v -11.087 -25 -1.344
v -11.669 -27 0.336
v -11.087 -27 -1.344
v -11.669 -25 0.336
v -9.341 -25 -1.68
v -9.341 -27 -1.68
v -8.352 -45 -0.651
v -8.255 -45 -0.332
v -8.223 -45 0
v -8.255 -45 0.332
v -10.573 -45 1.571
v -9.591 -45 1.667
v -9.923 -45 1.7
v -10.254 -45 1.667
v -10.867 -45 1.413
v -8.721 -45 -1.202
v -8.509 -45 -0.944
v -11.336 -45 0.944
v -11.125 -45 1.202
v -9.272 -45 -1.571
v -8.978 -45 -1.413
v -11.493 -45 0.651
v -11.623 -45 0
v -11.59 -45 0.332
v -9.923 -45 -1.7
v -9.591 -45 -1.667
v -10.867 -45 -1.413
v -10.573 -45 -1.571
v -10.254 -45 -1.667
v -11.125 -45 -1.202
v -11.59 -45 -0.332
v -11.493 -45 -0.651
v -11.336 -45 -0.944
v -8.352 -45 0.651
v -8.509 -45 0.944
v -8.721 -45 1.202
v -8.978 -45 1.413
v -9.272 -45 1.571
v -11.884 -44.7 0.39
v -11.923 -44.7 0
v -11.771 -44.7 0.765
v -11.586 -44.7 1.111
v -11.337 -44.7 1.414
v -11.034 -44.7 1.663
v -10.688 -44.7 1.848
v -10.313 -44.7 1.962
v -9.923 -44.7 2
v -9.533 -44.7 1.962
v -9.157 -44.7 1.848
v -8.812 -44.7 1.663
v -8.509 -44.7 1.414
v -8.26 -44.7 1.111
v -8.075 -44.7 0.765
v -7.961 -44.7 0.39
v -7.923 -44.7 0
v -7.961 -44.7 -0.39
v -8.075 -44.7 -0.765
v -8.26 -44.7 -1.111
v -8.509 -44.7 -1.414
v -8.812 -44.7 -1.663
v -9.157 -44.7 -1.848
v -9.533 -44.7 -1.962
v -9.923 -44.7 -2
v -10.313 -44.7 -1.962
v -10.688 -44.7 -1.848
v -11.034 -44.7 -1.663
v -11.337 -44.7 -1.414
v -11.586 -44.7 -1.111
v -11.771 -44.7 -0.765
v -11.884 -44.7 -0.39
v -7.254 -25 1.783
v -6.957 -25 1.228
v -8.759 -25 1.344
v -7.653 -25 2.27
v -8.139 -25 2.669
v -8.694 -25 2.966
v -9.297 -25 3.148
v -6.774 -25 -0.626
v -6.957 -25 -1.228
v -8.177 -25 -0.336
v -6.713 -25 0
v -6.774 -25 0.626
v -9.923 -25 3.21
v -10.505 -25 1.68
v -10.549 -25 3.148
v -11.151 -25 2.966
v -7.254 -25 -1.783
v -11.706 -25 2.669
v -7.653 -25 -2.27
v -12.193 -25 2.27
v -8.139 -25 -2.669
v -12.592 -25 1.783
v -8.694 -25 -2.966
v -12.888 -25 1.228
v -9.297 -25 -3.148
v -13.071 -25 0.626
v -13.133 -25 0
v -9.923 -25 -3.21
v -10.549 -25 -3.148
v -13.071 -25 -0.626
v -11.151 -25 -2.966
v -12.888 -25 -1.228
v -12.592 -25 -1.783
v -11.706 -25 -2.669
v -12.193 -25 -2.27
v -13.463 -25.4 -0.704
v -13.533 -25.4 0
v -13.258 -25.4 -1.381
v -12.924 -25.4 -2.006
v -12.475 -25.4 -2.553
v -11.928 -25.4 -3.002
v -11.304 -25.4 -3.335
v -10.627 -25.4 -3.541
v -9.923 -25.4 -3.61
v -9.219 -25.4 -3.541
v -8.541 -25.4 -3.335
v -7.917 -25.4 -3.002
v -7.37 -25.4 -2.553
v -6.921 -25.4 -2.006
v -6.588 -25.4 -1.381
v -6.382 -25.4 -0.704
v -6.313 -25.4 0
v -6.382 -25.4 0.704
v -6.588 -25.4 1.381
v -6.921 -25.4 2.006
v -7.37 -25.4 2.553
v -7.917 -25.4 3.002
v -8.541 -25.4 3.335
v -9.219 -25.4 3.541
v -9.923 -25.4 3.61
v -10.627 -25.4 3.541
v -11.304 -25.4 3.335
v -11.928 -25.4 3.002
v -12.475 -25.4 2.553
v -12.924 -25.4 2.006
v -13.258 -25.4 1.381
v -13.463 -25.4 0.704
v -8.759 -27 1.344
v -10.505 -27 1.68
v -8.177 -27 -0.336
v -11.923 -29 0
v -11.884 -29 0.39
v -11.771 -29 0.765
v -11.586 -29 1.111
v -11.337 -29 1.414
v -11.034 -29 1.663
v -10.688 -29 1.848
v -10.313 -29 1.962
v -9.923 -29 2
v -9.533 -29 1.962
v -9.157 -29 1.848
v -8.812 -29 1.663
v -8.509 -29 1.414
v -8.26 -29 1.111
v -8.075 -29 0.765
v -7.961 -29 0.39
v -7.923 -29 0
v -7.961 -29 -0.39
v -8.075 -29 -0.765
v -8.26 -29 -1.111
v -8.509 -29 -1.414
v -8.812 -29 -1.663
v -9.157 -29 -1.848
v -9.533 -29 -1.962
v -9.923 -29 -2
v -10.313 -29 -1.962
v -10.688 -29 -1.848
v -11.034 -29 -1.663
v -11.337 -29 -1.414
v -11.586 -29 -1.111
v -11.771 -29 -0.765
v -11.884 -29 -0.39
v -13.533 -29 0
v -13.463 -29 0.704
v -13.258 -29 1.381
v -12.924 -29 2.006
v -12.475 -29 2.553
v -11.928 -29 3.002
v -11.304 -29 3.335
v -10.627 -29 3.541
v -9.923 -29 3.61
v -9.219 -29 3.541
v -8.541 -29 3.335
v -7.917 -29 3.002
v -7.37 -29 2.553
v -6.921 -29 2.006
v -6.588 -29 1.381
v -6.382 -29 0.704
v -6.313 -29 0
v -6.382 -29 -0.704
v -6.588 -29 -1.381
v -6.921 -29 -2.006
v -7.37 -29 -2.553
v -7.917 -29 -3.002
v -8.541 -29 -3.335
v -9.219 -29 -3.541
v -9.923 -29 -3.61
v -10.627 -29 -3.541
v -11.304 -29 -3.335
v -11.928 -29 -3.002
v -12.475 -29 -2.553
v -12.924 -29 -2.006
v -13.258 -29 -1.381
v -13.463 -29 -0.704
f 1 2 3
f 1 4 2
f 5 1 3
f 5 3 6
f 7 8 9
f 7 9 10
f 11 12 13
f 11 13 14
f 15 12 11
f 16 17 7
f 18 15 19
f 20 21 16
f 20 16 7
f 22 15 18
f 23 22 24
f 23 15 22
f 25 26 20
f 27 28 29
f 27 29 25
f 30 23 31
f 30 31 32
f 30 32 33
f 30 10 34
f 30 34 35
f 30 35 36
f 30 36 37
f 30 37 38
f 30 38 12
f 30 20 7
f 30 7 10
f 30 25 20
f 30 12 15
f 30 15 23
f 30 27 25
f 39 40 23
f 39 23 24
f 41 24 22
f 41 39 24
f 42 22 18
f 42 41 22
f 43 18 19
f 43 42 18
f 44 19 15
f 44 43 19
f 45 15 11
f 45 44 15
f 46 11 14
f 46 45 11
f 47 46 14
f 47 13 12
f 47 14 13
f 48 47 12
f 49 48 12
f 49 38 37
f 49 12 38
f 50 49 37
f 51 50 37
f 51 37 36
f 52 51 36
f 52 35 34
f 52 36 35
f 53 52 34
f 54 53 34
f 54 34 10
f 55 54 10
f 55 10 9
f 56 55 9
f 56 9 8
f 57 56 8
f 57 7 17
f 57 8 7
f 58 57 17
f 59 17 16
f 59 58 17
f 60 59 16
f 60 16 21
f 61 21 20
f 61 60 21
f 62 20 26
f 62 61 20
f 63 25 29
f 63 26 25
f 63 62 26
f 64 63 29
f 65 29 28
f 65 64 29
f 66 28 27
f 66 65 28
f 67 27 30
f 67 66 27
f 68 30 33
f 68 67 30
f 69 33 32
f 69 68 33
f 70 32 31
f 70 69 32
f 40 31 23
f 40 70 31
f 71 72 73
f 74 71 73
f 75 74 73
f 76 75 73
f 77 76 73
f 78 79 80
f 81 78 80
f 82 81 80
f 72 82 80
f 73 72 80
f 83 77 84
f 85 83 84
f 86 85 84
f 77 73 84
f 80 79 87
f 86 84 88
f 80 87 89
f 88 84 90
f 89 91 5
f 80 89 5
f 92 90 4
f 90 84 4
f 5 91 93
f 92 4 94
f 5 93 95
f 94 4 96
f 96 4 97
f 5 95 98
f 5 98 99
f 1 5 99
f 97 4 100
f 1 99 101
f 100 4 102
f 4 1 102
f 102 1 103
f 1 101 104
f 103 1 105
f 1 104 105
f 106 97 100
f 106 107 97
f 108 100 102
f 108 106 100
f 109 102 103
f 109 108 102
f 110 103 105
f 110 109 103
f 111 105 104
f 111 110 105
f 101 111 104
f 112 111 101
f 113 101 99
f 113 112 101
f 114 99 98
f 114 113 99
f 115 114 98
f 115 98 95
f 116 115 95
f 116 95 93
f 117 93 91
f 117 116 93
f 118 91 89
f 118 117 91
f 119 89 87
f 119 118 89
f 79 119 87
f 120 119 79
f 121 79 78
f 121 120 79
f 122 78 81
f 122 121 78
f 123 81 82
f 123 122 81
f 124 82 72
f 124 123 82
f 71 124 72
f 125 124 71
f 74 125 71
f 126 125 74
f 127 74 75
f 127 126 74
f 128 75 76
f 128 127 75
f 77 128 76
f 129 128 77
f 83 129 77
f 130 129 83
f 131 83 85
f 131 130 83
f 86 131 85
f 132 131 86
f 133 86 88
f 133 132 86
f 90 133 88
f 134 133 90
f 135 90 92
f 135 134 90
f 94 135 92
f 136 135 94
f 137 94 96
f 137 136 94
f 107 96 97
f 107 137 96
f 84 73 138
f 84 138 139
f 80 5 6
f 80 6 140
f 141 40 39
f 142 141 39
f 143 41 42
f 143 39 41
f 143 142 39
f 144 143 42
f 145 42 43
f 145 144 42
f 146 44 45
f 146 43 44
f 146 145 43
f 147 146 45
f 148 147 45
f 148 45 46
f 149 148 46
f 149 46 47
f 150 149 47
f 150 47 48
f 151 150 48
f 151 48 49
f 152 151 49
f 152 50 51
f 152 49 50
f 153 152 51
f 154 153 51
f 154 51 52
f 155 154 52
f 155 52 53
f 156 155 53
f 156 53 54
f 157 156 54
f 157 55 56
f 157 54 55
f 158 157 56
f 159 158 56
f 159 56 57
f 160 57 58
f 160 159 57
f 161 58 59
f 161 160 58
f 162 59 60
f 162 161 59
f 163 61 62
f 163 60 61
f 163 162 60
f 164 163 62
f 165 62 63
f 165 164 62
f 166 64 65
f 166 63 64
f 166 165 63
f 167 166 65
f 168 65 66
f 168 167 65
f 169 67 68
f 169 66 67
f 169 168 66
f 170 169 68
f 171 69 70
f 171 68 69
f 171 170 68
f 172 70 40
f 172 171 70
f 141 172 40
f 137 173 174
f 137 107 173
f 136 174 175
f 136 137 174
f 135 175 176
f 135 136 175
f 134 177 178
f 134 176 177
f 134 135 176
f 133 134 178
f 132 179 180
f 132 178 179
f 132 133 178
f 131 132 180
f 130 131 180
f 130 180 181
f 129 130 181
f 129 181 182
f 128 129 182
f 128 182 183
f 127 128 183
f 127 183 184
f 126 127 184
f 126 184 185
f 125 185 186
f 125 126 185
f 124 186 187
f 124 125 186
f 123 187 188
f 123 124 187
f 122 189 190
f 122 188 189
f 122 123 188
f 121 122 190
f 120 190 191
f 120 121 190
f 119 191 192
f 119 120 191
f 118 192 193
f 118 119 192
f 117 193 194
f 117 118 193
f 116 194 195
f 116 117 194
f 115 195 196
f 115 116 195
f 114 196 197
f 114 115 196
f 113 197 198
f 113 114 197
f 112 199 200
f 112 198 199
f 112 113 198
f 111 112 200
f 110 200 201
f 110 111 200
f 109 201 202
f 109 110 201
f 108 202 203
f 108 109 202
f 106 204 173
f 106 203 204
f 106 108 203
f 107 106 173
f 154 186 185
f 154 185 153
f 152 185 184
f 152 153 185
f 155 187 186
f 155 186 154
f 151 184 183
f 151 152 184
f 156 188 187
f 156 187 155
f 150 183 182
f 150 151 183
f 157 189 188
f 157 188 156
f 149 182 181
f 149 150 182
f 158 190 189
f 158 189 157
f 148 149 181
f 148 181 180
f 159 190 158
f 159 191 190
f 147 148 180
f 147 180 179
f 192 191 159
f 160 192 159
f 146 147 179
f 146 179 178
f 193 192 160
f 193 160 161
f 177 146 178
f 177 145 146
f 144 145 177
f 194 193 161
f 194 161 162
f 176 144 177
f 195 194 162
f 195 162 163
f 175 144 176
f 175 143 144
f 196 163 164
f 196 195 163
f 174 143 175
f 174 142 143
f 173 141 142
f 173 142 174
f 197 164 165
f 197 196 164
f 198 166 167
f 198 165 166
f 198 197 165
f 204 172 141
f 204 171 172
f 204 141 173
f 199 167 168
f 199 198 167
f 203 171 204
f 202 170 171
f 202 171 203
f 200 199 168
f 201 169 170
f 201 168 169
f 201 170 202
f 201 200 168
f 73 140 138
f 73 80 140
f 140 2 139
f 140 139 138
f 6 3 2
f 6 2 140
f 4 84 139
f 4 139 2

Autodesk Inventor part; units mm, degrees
ref_plane "YZ Plane" through (0, 0, 0) normal (1, 0, 0) x (0, 1, 0)
ref_plane "XZ Plane" through (0, 0, 0) normal (0, 1, 0) x (-1, 0, 0)
ref_plane "XY Plane" through (0, 0, 0) normal (0, 0, 1) x (1, 0, 0)
sketch "Sketch1" plane through (0, 0, 0) normal (0, 0, 1) x (1, 0, 0)
  line L0 (-9.9228, -29) -> (-13.5328, -29)
  line L1 (-13.5328, -29) -> (-13.5328, -25)
  line L2 (-13.5328, -25) -> (-9.9228, -25)
  line L3 (-9.9228, -25) -> (-9.9228, -29)
  line L4 (-9.9228, -29) -> (-9.9228, -45)
  line L5 (-9.9228, -45) -> (-11.9228, -45)
  line L6 (-11.9228, -45) -> (-11.9228, -29)
  point P0 (0, 0)
  dimension "d0" = 3.61
  dimension "d1" = 4
  dimension "d2" = 16
  dimension "d3" = 2
revolve "Revolution1" add sketch "Sketch1" angle 360 about axis through (-9.9228, -29, 0) along (0, -1, 0)
chamfer "Chamfer1" distance 0.4 angle 45 1 edges at (-6.3128, -25, 0)
sketch "Boceto2" plane through (-9.9228, -25, 0) normal (0, 1, 0) x (1, 0, 0)
  line L0 (1.1641, -1.3443) -> (-0.5821, -1.6803)
  line L1 (-0.5821, -1.6803) -> (-1.7462, -0.336)
  line L2 (-1.7462, -0.336) -> (-1.1641, 1.3443)
  line L3 (-1.1641, 1.3443) -> (0.5821, 1.6803)
  line L4 (0.5821, 1.6803) -> (1.7462, 0.336)
  line L5 (1.7462, 0.336) -> (1.1641, -1.3443)
  point P0 (9.9228, 0)
  point P1 (0, 0)
  dimension "d11" = 3.08
extrude "Extrusión1" cut sketch "Boceto2" against normal blind 2
thread "Rosca1" size "M4x0.7" class "6g" standard "ISO Metric profile" length 430
chamfer "Chamfer3" distance 0.3 angle 45 1 edges at (-7.9228, -45, 0)
properties part number "Tornillo Allen cabeza cilindrica M4x16mm"
